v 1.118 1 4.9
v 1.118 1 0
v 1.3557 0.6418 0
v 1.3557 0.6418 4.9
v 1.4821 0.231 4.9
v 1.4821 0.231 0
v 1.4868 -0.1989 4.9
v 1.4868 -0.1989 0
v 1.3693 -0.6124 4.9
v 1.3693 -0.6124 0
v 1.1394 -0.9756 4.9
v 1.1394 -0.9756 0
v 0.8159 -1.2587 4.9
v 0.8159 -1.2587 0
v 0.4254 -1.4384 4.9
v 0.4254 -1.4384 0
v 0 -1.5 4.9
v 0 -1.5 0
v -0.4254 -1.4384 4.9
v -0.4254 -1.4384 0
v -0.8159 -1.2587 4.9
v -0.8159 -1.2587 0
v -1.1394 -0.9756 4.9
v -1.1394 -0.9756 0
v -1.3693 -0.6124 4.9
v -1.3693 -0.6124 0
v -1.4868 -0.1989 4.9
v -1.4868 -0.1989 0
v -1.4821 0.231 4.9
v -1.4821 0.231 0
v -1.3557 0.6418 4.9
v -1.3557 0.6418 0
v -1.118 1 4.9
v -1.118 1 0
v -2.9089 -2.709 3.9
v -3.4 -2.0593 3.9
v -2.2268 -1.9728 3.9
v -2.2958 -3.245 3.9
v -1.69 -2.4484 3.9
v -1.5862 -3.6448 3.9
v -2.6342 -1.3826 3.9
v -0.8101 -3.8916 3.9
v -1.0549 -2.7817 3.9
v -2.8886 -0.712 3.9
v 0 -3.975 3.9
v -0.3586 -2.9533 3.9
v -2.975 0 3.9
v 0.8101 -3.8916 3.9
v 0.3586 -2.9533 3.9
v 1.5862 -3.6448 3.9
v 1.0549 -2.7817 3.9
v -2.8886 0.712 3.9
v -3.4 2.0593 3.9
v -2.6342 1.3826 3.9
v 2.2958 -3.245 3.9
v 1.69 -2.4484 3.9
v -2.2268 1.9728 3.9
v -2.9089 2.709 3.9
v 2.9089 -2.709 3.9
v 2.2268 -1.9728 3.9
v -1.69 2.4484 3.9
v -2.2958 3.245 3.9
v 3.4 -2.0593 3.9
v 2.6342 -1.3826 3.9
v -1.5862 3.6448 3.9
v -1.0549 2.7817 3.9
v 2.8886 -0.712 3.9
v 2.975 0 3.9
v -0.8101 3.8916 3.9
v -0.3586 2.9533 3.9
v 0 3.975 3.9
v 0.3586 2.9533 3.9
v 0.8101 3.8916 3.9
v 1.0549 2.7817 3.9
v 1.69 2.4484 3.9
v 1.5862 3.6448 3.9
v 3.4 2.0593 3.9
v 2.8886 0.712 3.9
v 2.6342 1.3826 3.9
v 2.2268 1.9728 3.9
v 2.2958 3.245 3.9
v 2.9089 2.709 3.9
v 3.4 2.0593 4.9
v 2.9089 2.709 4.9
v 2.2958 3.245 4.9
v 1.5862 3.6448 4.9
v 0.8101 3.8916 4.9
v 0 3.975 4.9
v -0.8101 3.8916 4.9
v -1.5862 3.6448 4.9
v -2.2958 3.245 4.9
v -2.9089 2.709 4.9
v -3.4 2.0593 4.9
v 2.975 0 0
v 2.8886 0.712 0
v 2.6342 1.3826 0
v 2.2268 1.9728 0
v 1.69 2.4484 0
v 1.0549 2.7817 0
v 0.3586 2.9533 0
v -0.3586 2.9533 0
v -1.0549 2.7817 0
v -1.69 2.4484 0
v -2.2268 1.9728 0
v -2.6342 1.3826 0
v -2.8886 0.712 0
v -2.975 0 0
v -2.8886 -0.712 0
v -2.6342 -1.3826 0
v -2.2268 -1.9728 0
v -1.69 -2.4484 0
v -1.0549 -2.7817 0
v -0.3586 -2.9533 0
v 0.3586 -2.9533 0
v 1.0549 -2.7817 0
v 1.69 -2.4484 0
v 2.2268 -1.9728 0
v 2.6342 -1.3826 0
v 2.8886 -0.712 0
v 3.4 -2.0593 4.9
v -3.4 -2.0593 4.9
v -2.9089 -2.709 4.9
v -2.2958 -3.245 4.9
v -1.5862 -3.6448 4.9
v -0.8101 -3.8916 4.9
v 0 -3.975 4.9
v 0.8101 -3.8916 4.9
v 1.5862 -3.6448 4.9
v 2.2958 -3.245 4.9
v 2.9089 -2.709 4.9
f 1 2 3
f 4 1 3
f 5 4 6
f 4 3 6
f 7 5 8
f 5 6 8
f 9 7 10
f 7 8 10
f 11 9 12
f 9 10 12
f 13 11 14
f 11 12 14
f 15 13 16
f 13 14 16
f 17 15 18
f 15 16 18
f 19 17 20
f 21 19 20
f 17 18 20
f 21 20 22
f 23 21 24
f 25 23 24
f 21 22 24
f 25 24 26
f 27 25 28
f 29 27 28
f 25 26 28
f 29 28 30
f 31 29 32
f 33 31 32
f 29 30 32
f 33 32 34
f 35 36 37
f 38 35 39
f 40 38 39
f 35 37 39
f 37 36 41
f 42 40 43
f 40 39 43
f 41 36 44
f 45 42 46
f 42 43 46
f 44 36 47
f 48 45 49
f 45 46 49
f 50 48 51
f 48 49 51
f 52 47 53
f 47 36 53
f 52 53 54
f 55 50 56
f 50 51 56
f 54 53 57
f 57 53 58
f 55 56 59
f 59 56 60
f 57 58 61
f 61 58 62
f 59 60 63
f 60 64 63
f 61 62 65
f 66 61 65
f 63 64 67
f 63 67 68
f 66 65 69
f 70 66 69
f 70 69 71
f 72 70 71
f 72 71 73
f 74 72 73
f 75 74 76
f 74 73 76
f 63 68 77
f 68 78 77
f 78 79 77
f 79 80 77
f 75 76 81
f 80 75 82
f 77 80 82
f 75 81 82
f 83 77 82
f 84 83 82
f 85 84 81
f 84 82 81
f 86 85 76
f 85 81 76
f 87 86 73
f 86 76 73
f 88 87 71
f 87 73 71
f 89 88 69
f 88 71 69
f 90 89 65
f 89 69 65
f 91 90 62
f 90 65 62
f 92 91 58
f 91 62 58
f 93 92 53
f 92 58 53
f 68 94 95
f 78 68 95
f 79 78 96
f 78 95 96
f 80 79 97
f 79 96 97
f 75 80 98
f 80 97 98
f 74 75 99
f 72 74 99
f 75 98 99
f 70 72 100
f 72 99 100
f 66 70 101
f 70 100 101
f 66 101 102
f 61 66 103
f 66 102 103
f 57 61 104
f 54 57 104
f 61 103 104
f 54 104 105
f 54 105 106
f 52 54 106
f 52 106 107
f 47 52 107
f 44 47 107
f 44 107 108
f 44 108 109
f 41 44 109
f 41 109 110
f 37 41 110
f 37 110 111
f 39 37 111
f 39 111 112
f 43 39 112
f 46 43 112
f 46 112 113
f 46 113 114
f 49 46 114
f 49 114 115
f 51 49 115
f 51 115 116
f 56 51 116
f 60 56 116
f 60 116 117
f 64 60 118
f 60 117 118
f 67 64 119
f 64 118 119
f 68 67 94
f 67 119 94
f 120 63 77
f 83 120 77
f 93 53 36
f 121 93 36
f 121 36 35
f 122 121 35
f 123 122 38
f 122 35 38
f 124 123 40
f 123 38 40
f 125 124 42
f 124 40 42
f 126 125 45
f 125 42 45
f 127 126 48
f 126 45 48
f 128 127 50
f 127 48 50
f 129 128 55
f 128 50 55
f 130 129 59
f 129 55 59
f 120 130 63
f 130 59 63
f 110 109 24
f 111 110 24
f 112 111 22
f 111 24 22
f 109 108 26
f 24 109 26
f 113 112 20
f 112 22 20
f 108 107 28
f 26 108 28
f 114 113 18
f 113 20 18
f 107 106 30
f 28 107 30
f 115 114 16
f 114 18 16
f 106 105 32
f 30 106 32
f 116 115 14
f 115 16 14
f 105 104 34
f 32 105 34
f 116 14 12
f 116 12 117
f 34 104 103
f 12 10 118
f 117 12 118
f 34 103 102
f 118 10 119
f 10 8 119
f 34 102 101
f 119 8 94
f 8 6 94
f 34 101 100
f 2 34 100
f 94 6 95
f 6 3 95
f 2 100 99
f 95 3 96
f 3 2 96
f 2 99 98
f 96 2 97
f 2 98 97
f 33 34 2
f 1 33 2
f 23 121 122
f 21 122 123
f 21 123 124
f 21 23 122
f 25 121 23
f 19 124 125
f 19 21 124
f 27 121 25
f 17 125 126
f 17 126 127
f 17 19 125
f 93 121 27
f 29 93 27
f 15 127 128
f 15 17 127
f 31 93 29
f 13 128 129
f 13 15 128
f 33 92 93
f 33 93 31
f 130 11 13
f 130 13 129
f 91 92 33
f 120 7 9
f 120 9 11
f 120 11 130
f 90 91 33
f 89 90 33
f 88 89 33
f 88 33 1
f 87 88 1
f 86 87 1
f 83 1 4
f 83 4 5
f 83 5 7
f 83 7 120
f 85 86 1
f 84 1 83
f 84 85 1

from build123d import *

# Parameters (mm, degrees)
SKETCH1_R           = 2.975
BOSS_EXTRUDE1_DEPTH = 4.9
BOSS_EXTRUDE2_START = -1
SKETCH2_R           = 2.975
BOSS_EXTRUDE2_DEPTH = 1


with BuildPart() as part:
    # Sketch1 → Boss-Extrude1 (new body)
    with BuildSketch(Plane.XY):
        Circle(SKETCH1_R)
        with BuildLine():
            Line((-1.118033989, 1), (1.118033989, 1))
            ThreePointArc((1.118033989, 1), (0, -1.5), (-1.118033989, 1))
        make_face(mode=Mode.SUBTRACT)
    extrude(amount=BOSS_EXTRUDE1_DEPTH)

    # Sketch2 → Boss-Extrude2 (add)
    with BuildSketch(Plane.XY.offset(4.9).offset(BOSS_EXTRUDE2_START)):
        with BuildLine():
            Line((3.4, -2.059277786), (3.4, 2.059277786))
            ThreePointArc((3.4, 2.059277786), (0, 3.975), (-3.4, 2.059277786))
            Line((-3.4, 2.059277786), (-3.4, -2.059277786))
            ThreePointArc((-3.4, -2.059277786), (0, -3.975), (3.4, -2.059277786))
        make_face()
        Circle(SKETCH2_R, mode=Mode.SUBTRACT)
    extrude(amount=BOSS_EXTRUDE2_DEPTH)


solid = part.part
